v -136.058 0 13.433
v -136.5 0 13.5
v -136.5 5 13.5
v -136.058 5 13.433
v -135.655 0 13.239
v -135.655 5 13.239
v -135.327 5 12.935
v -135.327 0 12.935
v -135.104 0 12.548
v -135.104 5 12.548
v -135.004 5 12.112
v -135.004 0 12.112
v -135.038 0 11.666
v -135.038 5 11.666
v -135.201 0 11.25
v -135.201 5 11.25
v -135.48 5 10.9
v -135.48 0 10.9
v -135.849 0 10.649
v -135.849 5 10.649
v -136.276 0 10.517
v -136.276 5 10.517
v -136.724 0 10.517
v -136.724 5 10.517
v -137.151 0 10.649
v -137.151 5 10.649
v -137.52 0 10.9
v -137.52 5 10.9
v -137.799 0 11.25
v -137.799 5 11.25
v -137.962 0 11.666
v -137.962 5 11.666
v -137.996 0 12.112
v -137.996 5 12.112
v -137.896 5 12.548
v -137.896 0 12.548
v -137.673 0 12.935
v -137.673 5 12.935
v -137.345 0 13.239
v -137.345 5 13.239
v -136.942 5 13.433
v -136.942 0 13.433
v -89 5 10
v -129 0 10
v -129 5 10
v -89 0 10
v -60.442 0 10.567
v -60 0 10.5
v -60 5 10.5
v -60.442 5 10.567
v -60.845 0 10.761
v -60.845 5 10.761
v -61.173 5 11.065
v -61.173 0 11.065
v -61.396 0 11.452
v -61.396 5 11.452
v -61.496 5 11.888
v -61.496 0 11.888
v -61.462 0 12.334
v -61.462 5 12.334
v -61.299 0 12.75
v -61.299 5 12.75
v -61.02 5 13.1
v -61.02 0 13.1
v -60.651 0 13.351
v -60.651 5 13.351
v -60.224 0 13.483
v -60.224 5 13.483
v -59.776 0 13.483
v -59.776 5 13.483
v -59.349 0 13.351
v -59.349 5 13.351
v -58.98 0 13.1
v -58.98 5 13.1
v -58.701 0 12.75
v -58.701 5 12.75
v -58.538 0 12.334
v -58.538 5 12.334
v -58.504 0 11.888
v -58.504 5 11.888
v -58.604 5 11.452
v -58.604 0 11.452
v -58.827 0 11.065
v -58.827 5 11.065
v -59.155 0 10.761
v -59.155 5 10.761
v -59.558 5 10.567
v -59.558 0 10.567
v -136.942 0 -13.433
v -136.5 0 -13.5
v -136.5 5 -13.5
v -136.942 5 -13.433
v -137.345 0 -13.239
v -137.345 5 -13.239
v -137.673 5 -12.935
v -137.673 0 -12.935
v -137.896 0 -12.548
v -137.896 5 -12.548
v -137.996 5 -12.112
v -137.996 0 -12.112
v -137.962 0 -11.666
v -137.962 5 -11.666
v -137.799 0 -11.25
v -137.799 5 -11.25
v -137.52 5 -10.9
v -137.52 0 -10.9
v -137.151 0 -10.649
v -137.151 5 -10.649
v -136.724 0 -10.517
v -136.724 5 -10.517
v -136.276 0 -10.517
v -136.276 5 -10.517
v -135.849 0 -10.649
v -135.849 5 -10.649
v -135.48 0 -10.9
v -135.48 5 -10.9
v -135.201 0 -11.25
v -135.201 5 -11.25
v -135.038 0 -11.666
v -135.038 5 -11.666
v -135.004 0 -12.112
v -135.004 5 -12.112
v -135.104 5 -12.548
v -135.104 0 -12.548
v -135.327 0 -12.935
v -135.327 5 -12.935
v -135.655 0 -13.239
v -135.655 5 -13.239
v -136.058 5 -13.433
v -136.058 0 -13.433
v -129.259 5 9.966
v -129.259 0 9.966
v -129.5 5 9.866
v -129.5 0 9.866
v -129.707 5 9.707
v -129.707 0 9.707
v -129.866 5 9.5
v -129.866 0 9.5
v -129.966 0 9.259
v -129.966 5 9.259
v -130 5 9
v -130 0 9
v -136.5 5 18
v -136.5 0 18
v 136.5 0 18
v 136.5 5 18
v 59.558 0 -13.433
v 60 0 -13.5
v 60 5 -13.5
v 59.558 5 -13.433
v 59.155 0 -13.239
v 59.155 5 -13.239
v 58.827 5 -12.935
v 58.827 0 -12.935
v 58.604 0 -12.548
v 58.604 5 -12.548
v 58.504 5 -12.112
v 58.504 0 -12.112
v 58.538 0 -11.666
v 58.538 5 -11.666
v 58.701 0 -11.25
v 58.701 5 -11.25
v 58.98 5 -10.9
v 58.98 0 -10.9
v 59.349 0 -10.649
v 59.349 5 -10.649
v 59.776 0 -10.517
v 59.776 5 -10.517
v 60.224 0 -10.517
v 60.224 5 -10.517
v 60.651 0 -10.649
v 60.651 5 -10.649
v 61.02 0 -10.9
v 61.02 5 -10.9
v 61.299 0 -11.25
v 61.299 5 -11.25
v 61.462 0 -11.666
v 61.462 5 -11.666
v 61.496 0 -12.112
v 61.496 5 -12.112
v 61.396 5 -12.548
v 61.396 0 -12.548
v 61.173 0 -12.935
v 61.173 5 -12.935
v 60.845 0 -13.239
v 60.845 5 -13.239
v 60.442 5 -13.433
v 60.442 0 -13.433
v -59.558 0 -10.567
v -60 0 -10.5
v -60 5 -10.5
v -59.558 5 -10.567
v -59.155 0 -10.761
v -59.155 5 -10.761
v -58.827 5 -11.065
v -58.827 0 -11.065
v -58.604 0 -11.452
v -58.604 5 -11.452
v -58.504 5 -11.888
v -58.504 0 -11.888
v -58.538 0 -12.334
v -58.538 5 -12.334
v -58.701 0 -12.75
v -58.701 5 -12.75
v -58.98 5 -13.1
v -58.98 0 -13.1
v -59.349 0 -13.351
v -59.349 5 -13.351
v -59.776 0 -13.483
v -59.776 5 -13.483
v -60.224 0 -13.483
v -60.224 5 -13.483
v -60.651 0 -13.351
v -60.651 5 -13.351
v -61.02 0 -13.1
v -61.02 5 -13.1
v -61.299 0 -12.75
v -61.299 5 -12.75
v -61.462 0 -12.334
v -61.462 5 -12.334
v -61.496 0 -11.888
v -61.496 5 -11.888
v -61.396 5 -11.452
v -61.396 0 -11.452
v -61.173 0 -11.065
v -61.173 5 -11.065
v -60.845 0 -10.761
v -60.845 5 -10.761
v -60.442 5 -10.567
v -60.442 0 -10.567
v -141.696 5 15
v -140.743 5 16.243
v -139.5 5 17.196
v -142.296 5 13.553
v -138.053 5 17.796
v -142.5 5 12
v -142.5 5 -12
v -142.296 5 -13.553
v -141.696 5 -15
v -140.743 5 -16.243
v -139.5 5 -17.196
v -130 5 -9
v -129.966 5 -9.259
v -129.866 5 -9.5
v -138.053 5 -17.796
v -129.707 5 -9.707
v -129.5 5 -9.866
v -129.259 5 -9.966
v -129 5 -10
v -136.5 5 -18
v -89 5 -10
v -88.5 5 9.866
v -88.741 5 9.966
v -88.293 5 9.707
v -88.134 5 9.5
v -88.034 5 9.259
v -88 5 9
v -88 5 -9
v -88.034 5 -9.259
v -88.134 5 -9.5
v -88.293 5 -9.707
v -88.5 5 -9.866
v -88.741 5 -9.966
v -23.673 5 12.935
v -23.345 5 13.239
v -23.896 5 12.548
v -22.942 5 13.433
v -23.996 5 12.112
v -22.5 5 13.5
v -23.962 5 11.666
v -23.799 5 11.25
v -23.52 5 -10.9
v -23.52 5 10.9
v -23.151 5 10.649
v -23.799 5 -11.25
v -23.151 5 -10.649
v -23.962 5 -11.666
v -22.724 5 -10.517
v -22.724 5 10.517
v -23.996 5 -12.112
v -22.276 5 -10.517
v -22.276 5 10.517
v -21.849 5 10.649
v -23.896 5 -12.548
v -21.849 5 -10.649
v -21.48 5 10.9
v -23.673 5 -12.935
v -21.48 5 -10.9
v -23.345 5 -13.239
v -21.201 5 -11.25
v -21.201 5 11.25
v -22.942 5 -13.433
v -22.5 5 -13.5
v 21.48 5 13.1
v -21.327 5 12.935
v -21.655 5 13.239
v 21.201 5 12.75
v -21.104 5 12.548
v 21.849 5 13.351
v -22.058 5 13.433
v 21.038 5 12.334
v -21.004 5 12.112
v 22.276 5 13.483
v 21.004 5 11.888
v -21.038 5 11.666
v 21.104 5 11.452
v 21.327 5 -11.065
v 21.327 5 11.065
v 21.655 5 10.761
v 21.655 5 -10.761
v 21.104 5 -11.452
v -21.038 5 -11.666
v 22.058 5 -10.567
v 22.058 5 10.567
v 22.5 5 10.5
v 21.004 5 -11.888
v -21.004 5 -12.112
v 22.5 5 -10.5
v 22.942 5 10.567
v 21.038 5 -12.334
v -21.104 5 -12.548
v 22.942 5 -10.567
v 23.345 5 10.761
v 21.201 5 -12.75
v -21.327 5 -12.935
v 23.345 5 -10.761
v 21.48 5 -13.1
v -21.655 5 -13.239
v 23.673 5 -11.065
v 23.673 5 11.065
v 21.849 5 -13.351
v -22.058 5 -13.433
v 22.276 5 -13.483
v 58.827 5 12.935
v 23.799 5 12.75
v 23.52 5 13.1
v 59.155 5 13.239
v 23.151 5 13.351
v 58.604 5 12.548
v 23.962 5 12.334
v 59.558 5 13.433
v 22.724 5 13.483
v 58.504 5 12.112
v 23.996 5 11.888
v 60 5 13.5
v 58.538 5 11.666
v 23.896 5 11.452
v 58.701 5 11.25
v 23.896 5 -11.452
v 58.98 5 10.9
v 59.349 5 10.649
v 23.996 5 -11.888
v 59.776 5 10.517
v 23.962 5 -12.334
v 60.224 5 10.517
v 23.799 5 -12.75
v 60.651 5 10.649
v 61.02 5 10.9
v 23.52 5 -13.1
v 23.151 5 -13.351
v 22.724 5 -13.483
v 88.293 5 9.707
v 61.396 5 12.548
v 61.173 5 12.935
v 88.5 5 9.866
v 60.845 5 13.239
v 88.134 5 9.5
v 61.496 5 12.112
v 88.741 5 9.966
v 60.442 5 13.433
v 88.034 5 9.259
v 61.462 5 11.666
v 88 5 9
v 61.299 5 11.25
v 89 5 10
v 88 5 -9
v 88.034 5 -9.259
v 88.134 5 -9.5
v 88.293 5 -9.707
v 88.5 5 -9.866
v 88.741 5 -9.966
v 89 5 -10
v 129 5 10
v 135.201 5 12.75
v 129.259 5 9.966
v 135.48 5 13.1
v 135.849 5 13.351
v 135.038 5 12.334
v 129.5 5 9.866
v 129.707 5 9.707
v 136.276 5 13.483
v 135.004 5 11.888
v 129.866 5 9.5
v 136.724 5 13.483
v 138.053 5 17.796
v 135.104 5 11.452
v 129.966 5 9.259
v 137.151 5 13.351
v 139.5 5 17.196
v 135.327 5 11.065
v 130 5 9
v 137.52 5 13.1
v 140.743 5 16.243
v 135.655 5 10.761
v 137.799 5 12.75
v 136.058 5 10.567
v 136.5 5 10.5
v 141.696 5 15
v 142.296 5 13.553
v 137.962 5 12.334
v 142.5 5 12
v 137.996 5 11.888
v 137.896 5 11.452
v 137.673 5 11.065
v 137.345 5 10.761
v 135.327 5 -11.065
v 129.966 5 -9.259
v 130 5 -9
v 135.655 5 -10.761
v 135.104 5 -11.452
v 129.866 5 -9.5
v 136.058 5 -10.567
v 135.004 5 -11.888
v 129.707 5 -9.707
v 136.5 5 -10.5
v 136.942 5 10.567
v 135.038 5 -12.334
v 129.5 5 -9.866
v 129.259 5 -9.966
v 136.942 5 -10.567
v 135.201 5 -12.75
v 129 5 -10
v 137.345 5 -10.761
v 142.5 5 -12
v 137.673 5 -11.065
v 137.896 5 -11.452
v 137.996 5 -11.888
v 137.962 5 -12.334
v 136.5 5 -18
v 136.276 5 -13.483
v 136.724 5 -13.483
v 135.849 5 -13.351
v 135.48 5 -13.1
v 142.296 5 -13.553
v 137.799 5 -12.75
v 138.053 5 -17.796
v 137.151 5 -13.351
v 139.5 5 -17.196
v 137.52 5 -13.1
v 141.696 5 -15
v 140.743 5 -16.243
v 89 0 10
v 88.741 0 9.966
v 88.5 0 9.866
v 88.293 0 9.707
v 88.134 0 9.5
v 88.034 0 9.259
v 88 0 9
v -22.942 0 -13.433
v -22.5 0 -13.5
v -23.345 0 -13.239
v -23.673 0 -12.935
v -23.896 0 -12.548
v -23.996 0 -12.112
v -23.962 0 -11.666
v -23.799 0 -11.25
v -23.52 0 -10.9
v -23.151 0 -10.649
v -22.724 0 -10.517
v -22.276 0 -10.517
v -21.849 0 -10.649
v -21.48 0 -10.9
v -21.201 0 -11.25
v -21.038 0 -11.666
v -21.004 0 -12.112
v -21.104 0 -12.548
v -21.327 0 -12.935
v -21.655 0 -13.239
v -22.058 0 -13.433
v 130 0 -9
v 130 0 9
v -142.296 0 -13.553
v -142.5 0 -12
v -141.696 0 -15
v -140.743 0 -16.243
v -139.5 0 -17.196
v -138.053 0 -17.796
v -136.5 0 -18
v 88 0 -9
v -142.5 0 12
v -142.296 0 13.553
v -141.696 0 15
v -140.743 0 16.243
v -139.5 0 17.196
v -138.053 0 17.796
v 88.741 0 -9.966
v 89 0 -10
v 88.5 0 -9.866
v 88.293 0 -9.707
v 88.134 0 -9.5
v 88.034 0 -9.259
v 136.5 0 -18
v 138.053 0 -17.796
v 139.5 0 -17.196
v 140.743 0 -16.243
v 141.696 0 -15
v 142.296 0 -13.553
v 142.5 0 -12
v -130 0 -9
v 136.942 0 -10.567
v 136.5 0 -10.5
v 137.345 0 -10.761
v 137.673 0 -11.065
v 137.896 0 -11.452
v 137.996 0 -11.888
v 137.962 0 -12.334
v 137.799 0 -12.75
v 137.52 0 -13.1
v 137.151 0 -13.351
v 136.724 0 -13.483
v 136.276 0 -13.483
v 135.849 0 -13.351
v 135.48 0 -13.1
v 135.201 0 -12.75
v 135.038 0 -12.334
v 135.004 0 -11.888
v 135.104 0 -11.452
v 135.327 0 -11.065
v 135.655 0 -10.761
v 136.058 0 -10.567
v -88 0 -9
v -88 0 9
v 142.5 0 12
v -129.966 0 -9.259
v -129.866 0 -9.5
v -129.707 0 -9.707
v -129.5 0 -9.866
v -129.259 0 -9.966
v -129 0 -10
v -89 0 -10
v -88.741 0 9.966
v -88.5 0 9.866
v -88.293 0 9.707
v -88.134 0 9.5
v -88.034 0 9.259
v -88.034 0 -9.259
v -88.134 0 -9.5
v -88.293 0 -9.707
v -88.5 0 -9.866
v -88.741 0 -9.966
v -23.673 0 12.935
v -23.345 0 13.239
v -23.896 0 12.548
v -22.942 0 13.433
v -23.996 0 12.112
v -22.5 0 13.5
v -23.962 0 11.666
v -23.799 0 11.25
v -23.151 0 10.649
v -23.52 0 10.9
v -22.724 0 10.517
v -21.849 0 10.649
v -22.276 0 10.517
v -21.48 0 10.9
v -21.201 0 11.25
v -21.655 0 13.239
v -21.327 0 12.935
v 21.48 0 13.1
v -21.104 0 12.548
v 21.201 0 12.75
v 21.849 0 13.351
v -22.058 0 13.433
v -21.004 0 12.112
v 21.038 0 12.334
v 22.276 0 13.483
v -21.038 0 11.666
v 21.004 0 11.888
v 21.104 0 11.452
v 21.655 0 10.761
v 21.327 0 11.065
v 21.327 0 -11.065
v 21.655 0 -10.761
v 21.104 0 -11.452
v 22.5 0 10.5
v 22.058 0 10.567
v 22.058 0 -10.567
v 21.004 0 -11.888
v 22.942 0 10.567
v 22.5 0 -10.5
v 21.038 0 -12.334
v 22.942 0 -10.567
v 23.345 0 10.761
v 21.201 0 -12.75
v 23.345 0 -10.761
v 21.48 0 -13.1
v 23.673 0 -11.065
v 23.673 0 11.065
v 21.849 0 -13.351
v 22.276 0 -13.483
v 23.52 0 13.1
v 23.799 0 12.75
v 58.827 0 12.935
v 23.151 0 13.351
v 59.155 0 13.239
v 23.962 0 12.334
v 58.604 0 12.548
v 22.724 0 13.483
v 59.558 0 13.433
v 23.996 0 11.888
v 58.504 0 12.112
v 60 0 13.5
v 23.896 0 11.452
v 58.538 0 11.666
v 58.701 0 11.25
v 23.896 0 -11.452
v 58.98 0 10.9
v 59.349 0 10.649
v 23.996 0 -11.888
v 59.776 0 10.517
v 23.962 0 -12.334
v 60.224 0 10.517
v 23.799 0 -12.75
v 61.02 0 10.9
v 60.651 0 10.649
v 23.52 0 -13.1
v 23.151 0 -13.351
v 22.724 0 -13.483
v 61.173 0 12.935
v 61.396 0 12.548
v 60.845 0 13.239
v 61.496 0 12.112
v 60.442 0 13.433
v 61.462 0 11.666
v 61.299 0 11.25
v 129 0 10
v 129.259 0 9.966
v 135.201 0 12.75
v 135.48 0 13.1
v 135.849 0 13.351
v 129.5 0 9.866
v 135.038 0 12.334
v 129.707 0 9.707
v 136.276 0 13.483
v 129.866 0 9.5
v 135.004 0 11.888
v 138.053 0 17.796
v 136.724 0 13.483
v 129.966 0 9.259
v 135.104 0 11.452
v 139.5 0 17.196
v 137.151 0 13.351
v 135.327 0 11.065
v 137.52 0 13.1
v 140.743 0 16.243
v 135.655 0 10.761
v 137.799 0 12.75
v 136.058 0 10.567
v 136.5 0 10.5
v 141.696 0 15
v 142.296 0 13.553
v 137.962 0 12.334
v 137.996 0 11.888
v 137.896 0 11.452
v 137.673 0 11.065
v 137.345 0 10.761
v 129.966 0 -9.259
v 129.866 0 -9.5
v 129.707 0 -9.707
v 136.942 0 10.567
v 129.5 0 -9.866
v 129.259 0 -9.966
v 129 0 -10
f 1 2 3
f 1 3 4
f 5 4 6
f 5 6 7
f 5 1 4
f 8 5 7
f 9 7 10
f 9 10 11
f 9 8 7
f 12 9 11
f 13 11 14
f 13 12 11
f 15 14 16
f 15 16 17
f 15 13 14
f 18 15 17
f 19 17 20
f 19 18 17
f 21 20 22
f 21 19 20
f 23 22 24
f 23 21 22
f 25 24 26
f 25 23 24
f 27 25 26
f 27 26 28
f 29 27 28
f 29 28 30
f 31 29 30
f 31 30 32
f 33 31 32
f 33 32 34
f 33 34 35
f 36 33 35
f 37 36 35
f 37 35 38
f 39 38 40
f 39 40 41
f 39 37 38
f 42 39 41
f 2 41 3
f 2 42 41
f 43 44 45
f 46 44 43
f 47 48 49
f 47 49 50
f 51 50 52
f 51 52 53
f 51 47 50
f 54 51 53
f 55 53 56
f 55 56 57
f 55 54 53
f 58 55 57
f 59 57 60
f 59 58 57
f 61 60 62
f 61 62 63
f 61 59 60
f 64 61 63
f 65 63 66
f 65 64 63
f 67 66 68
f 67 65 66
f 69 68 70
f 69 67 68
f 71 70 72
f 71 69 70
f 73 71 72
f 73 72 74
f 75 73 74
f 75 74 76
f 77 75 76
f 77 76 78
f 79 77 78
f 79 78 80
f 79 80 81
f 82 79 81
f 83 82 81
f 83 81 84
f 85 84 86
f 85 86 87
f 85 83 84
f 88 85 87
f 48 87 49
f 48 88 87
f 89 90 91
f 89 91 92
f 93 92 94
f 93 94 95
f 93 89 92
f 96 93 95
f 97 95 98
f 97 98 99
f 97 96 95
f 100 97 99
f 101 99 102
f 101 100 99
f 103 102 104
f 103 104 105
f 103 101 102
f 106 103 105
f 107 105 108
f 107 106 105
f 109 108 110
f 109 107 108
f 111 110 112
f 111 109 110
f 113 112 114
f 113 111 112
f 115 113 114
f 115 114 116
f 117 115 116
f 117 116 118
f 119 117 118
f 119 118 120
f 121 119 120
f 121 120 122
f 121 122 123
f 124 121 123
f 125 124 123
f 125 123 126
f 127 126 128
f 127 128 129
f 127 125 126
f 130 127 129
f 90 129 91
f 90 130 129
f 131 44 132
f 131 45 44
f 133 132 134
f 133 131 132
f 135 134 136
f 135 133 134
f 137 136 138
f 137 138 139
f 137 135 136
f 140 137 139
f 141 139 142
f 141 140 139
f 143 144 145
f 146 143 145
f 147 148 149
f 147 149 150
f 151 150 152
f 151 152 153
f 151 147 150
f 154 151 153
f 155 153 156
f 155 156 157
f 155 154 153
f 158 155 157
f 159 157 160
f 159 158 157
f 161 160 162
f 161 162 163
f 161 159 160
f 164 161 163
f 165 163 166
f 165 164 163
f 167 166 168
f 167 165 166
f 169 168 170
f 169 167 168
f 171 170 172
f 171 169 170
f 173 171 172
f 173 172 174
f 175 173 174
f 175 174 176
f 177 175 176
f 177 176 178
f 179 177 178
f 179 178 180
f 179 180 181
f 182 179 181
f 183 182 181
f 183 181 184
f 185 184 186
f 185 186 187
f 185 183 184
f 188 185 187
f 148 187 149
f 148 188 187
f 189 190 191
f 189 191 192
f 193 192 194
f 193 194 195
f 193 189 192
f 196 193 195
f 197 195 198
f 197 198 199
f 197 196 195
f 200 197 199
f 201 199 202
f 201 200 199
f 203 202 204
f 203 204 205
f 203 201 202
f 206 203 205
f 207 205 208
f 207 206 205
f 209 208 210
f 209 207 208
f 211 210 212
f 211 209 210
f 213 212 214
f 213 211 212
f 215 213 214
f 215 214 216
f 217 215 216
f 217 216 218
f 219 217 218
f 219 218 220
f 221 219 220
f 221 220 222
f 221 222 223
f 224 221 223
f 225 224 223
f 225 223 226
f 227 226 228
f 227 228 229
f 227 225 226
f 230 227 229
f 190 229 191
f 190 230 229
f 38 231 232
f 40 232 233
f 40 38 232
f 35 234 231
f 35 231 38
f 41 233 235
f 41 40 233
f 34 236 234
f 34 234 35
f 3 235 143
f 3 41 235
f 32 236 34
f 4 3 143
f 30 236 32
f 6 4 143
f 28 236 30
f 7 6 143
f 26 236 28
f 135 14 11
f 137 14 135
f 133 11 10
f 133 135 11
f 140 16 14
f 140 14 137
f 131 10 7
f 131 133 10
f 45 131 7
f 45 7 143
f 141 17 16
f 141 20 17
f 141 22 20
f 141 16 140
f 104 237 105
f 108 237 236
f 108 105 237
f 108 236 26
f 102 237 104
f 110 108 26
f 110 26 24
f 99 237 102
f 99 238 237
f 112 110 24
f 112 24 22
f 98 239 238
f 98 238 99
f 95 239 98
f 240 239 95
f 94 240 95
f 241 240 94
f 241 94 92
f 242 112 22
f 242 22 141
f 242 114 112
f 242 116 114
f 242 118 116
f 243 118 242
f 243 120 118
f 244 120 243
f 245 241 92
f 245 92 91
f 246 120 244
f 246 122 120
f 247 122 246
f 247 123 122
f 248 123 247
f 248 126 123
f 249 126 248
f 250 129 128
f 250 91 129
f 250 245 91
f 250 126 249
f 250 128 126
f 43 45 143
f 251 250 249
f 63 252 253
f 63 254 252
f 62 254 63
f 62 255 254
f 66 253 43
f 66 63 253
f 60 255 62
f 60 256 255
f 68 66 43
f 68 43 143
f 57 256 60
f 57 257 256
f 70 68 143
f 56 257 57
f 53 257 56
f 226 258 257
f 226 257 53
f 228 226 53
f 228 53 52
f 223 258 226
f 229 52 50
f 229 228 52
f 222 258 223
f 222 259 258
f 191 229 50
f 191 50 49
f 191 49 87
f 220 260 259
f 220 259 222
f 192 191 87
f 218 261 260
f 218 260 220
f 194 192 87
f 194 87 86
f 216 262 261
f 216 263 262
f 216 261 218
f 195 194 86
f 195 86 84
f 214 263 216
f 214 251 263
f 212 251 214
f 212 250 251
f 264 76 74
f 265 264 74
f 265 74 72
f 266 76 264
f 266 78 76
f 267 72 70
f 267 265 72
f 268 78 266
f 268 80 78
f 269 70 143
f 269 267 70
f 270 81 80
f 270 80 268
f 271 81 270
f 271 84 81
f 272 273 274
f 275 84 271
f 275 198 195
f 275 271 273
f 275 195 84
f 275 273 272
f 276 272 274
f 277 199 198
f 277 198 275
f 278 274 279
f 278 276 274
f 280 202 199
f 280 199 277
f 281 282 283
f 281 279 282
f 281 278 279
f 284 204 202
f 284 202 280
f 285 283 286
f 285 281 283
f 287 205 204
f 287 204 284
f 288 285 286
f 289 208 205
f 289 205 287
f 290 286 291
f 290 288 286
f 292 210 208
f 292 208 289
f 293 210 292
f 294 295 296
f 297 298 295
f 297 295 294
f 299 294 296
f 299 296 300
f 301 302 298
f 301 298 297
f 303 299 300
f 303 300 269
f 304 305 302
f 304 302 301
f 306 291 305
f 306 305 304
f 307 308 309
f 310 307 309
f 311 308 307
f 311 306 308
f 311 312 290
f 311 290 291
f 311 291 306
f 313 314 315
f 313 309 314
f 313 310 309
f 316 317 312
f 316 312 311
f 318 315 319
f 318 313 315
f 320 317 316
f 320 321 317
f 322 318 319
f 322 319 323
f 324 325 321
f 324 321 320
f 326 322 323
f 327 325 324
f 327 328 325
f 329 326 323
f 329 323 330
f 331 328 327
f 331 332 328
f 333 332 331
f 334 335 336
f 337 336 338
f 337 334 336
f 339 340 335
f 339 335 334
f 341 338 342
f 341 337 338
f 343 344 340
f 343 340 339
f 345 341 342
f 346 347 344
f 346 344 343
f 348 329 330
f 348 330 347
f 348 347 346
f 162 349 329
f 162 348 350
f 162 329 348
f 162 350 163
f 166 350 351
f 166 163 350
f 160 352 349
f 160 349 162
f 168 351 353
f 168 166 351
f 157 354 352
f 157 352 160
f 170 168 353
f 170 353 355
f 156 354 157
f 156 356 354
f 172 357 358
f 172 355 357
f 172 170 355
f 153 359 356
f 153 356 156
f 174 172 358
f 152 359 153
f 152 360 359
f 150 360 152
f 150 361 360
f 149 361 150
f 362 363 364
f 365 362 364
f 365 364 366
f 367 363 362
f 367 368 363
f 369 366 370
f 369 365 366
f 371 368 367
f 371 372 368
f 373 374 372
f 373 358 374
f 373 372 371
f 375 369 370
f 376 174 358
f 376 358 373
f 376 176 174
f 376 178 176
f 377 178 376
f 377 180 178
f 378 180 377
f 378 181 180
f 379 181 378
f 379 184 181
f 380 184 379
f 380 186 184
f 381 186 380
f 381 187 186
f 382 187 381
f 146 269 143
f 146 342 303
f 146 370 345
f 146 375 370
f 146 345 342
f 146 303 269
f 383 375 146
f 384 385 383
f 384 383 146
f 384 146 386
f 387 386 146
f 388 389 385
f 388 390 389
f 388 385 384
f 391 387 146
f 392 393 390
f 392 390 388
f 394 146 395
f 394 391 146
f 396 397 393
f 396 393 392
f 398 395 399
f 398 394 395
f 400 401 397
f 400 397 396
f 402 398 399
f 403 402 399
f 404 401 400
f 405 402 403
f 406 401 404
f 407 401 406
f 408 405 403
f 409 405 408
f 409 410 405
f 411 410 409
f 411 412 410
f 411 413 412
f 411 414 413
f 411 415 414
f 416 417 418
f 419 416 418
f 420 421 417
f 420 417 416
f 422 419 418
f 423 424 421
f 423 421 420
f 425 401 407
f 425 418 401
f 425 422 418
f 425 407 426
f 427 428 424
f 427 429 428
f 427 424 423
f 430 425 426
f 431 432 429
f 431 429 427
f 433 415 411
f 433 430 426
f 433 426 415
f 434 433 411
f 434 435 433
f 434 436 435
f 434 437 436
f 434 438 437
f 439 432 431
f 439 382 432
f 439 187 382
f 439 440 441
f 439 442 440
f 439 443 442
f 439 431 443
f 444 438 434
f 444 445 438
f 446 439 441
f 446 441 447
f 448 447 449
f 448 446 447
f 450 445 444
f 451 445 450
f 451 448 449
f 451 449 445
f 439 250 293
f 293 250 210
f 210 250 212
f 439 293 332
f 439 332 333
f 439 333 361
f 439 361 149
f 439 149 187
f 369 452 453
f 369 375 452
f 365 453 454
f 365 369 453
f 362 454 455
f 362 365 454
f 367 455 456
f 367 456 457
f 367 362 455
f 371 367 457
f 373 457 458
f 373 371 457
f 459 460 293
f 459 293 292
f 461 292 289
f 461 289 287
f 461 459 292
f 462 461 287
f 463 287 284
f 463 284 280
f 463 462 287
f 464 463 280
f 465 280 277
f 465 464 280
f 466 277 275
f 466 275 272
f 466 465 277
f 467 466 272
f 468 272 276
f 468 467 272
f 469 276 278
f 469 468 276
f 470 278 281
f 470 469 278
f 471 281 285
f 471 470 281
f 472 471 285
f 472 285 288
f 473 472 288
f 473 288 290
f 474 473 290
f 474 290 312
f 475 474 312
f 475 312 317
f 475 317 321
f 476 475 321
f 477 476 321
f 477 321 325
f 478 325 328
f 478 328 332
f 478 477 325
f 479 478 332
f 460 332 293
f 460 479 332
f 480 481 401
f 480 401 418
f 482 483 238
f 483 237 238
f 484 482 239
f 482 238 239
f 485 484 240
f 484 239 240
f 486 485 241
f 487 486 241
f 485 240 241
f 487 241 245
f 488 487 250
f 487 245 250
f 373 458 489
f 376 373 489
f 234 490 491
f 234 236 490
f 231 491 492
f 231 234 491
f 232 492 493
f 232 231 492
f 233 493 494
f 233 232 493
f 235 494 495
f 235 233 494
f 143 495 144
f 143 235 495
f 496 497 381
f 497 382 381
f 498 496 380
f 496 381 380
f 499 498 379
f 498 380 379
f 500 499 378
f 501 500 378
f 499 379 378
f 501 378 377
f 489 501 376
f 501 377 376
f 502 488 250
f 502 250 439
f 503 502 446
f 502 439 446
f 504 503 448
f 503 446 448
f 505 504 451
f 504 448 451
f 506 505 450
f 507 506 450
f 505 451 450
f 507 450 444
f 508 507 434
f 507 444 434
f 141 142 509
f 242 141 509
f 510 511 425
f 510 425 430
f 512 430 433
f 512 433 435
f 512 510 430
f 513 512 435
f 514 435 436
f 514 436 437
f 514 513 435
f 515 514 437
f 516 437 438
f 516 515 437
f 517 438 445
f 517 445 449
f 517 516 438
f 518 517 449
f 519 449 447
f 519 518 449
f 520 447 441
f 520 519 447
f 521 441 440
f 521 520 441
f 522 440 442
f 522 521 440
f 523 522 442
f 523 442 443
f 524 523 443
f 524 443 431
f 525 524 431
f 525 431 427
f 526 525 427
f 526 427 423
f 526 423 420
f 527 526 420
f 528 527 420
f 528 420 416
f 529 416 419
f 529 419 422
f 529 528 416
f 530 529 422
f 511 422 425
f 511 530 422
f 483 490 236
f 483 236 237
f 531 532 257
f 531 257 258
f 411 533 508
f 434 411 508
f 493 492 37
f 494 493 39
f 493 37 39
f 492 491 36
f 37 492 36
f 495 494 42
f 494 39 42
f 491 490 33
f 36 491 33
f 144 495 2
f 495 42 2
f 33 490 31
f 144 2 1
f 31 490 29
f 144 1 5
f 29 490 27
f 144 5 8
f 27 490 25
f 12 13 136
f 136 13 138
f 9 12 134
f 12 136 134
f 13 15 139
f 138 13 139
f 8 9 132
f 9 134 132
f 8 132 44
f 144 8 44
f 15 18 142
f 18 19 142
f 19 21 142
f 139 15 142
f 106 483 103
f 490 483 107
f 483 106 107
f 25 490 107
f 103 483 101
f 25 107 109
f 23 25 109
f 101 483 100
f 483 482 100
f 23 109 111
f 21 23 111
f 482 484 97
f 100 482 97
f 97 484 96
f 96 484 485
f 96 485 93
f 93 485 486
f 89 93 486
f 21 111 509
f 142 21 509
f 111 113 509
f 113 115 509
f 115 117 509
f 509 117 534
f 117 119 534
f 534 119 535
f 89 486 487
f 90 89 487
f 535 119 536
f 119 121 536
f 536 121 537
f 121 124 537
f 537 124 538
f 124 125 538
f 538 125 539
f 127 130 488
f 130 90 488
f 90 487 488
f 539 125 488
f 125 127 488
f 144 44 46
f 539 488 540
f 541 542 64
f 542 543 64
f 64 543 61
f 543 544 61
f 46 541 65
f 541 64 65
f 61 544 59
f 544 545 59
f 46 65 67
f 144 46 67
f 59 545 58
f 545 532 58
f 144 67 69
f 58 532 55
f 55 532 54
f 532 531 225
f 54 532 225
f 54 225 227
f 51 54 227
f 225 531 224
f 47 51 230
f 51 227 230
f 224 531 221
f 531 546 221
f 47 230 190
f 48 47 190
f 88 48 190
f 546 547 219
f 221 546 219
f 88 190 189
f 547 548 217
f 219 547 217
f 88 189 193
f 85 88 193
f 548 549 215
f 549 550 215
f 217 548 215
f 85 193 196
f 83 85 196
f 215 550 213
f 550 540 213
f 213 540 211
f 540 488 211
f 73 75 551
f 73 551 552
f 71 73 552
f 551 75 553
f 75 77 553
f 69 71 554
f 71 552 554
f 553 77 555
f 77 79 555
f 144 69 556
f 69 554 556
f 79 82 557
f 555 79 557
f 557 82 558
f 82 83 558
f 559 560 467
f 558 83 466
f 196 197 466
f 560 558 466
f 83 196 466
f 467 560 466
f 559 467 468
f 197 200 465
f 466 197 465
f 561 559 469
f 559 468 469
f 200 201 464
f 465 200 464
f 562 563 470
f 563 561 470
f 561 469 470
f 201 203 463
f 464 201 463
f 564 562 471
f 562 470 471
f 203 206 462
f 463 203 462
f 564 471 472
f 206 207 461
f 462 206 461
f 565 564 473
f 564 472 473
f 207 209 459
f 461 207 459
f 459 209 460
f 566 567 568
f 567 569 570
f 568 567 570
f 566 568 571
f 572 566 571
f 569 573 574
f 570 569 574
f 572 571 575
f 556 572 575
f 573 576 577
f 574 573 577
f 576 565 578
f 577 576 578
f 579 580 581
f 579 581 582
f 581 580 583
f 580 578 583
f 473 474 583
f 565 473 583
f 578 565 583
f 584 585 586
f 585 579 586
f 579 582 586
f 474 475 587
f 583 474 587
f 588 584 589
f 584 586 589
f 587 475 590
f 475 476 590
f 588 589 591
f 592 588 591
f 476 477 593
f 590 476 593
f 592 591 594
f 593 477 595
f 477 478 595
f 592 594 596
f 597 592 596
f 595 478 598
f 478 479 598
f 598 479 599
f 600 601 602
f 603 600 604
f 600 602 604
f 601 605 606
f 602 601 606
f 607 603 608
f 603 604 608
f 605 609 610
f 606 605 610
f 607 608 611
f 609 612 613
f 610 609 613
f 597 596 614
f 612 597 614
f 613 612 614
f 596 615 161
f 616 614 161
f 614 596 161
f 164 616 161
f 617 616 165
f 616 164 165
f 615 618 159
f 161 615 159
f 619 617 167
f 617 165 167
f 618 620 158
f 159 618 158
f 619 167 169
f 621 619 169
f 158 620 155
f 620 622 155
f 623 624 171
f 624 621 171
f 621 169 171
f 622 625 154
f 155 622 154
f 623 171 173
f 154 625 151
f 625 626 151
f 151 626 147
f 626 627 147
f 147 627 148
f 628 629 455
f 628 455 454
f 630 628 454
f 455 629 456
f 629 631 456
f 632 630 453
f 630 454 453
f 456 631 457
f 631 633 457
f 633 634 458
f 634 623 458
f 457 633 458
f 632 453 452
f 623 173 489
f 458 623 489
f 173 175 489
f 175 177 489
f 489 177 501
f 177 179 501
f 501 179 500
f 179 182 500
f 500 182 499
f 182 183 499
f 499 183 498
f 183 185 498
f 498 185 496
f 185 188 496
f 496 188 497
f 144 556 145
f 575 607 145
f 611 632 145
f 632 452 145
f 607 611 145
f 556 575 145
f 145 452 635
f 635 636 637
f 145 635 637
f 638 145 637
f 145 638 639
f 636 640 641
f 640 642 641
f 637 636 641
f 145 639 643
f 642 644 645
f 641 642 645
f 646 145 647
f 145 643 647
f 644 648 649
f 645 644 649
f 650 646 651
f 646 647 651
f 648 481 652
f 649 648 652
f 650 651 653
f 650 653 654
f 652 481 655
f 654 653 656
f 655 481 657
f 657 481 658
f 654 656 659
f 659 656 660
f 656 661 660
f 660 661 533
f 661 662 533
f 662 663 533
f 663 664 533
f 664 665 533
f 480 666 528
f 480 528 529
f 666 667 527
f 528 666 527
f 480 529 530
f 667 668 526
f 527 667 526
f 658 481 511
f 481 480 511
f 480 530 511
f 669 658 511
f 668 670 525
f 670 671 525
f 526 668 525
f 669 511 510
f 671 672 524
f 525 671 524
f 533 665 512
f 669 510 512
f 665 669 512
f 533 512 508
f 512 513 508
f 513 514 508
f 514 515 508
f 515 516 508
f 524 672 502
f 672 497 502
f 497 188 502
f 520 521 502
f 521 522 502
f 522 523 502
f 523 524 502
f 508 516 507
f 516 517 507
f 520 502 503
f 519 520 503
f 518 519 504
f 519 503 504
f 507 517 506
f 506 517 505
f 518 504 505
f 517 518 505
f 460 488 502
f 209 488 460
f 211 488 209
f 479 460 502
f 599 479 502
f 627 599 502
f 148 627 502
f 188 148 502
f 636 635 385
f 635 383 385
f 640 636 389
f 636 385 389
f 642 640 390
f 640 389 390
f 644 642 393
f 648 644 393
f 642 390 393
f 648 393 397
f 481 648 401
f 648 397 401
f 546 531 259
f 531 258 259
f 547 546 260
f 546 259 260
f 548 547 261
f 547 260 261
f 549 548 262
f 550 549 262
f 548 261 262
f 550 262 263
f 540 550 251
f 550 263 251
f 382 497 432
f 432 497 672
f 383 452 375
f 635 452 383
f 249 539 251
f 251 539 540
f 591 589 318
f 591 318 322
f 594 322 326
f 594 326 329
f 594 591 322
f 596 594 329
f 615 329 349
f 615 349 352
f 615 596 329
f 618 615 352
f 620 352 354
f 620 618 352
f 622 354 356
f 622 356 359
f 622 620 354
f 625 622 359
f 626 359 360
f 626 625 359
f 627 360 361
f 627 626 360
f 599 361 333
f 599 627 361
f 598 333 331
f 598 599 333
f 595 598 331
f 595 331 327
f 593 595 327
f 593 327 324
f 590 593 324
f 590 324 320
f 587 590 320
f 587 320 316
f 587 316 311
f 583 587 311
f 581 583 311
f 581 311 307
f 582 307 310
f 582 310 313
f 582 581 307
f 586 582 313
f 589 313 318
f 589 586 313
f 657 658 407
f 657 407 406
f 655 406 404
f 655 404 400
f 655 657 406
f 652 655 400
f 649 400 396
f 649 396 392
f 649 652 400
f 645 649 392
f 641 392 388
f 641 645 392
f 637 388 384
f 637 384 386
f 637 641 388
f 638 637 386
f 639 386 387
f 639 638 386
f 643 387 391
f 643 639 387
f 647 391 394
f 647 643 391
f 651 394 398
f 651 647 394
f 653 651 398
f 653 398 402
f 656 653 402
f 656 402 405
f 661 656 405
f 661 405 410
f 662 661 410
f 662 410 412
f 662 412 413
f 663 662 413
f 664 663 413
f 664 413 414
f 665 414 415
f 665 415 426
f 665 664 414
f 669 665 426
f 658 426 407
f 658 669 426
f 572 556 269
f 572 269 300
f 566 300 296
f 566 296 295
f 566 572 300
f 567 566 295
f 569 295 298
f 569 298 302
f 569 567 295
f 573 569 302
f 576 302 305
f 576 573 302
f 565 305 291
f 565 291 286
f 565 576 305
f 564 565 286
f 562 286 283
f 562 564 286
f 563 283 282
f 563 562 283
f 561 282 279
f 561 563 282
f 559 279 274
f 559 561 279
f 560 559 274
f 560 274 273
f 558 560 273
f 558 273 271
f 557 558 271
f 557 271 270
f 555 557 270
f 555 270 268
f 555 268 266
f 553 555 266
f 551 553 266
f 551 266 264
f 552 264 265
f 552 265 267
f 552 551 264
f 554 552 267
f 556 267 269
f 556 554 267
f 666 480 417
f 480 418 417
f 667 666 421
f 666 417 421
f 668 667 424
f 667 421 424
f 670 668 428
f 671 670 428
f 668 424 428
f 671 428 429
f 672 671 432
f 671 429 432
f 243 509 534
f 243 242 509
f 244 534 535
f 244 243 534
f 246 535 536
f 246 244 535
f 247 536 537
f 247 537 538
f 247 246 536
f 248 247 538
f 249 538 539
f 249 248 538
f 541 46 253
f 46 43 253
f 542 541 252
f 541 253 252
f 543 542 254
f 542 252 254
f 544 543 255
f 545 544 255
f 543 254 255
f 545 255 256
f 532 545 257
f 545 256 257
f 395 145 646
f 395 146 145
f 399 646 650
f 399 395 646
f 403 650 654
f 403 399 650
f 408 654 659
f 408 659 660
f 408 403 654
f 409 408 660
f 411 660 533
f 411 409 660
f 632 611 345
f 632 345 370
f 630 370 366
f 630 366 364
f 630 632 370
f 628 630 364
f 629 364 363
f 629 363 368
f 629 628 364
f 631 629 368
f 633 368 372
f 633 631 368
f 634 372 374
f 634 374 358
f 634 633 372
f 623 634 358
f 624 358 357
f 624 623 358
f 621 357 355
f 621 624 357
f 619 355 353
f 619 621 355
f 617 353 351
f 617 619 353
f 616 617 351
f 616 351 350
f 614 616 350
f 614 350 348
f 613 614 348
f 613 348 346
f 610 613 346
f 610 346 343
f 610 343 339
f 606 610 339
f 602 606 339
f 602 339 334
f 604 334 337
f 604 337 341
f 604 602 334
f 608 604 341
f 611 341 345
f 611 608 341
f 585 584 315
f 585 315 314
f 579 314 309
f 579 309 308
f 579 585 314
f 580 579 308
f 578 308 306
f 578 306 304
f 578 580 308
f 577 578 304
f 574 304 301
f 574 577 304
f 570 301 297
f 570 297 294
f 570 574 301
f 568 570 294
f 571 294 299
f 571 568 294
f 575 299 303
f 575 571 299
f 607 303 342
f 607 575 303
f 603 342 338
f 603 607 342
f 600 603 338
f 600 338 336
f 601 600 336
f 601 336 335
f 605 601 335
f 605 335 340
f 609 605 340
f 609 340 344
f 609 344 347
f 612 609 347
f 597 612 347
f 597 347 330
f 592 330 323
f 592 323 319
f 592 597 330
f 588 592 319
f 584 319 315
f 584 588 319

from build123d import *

# Parameters (mm, degrees)
SKETCH1_W           = 285
SKETCH1_H           = 36
SKETCH1_R           = 1.5
SKETCH1_W_2         = 42
SKETCH1_H_2         = 20
BOSS_EXTRUDE2_DEPTH = 5
FILLET1_R           = 6
FILLET2_R           = 1


with BuildPart() as part:
    # Sketch1 → Boss-Extrude2 (new body)
    with BuildSketch(Plane(origin=(0, 0, 0), x_dir=(1, 0, 0), z_dir=(0, 1, 0))):
        Rectangle(SKETCH1_W, SKETCH1_H)
        with Locations(Location((-22.5, -12, 0), (0, 0, 270))):
            Circle(SKETCH1_R, mode=Mode.SUBTRACT)
        with Locations(Location((-22.5, 12, 0), (0, 0, 90))):
            Circle(SKETCH1_R, mode=Mode.SUBTRACT)
        with Locations(Location((-136.5, -12, 0), (0, 0, 270))):
            Circle(SKETCH1_R, mode=Mode.SUBTRACT)
        with Locations(Location((-136.5, 12, 0), (0, 0, 90))):
            Circle(SKETCH1_R, mode=Mode.SUBTRACT)
        with Locations(Location((22.5, -12, 0), (0, 0, 90))):
            Circle(SKETCH1_R, mode=Mode.SUBTRACT)
        with Locations(Location((22.5, 12, 0), (0, 0, 270))):
            Circle(SKETCH1_R, mode=Mode.SUBTRACT)
        with Locations(Location((136.5, -12, 0), (0, 0, 90))):
            Circle(SKETCH1_R, mode=Mode.SUBTRACT)
        with Locations(Location((136.5, 12, 0), (0, 0, 270))):
            Circle(SKETCH1_R, mode=Mode.SUBTRACT)
        with Locations(Location((-60, 12, 0), (0, 0, 270))):
            Circle(SKETCH1_R, mode=Mode.SUBTRACT)
        with Locations(Location((-60, -12, 0), (0, 0, 90))):
            Circle(SKETCH1_R, mode=Mode.SUBTRACT)
        with Locations(Location((60, -12, 0), (0, 0, 270))):
            Circle(SKETCH1_R, mode=Mode.SUBTRACT)
        with Locations(Location((60, 12, 0), (0, 0, 90))):
            Circle(SKETCH1_R, mode=Mode.SUBTRACT)
        with Locations((-109, 0)):
            Rectangle(SKETCH1_W_2, SKETCH1_H_2, mode=Mode.SUBTRACT)
        with Locations((109, 0)):
            Rectangle(SKETCH1_W_2, SKETCH1_H_2, mode=Mode.SUBTRACT)
    extrude(amount=BOSS_EXTRUDE2_DEPTH)

    # Fillet1
    fillet1_edges = [part.edges().sort_by_distance(p)[0] for p in [
        (142.5, 2.5, 18),
        (-142.5, 2.5, 18),
        (-142.5, 2.5, -18),
        (142.5, 2.5, -18),
    ]]
    fillet(fillet1_edges, radius=FILLET1_R)

    # Fillet2
    fillet2_edges = [part.edges().sort_by_distance(p)[0] for p in [
        (-88, 2.5, 10),
        (-88, 2.5, -10),
        (-130, 2.5, -10),
        (-130, 2.5, 10),
        (88, 2.5, -10),
        (88, 2.5, 10),
        (130, 2.5, 10),
        (130, 2.5, -10),
    ]]
    fillet(fillet2_edges, radius=FILLET2_R)


solid = part.part
